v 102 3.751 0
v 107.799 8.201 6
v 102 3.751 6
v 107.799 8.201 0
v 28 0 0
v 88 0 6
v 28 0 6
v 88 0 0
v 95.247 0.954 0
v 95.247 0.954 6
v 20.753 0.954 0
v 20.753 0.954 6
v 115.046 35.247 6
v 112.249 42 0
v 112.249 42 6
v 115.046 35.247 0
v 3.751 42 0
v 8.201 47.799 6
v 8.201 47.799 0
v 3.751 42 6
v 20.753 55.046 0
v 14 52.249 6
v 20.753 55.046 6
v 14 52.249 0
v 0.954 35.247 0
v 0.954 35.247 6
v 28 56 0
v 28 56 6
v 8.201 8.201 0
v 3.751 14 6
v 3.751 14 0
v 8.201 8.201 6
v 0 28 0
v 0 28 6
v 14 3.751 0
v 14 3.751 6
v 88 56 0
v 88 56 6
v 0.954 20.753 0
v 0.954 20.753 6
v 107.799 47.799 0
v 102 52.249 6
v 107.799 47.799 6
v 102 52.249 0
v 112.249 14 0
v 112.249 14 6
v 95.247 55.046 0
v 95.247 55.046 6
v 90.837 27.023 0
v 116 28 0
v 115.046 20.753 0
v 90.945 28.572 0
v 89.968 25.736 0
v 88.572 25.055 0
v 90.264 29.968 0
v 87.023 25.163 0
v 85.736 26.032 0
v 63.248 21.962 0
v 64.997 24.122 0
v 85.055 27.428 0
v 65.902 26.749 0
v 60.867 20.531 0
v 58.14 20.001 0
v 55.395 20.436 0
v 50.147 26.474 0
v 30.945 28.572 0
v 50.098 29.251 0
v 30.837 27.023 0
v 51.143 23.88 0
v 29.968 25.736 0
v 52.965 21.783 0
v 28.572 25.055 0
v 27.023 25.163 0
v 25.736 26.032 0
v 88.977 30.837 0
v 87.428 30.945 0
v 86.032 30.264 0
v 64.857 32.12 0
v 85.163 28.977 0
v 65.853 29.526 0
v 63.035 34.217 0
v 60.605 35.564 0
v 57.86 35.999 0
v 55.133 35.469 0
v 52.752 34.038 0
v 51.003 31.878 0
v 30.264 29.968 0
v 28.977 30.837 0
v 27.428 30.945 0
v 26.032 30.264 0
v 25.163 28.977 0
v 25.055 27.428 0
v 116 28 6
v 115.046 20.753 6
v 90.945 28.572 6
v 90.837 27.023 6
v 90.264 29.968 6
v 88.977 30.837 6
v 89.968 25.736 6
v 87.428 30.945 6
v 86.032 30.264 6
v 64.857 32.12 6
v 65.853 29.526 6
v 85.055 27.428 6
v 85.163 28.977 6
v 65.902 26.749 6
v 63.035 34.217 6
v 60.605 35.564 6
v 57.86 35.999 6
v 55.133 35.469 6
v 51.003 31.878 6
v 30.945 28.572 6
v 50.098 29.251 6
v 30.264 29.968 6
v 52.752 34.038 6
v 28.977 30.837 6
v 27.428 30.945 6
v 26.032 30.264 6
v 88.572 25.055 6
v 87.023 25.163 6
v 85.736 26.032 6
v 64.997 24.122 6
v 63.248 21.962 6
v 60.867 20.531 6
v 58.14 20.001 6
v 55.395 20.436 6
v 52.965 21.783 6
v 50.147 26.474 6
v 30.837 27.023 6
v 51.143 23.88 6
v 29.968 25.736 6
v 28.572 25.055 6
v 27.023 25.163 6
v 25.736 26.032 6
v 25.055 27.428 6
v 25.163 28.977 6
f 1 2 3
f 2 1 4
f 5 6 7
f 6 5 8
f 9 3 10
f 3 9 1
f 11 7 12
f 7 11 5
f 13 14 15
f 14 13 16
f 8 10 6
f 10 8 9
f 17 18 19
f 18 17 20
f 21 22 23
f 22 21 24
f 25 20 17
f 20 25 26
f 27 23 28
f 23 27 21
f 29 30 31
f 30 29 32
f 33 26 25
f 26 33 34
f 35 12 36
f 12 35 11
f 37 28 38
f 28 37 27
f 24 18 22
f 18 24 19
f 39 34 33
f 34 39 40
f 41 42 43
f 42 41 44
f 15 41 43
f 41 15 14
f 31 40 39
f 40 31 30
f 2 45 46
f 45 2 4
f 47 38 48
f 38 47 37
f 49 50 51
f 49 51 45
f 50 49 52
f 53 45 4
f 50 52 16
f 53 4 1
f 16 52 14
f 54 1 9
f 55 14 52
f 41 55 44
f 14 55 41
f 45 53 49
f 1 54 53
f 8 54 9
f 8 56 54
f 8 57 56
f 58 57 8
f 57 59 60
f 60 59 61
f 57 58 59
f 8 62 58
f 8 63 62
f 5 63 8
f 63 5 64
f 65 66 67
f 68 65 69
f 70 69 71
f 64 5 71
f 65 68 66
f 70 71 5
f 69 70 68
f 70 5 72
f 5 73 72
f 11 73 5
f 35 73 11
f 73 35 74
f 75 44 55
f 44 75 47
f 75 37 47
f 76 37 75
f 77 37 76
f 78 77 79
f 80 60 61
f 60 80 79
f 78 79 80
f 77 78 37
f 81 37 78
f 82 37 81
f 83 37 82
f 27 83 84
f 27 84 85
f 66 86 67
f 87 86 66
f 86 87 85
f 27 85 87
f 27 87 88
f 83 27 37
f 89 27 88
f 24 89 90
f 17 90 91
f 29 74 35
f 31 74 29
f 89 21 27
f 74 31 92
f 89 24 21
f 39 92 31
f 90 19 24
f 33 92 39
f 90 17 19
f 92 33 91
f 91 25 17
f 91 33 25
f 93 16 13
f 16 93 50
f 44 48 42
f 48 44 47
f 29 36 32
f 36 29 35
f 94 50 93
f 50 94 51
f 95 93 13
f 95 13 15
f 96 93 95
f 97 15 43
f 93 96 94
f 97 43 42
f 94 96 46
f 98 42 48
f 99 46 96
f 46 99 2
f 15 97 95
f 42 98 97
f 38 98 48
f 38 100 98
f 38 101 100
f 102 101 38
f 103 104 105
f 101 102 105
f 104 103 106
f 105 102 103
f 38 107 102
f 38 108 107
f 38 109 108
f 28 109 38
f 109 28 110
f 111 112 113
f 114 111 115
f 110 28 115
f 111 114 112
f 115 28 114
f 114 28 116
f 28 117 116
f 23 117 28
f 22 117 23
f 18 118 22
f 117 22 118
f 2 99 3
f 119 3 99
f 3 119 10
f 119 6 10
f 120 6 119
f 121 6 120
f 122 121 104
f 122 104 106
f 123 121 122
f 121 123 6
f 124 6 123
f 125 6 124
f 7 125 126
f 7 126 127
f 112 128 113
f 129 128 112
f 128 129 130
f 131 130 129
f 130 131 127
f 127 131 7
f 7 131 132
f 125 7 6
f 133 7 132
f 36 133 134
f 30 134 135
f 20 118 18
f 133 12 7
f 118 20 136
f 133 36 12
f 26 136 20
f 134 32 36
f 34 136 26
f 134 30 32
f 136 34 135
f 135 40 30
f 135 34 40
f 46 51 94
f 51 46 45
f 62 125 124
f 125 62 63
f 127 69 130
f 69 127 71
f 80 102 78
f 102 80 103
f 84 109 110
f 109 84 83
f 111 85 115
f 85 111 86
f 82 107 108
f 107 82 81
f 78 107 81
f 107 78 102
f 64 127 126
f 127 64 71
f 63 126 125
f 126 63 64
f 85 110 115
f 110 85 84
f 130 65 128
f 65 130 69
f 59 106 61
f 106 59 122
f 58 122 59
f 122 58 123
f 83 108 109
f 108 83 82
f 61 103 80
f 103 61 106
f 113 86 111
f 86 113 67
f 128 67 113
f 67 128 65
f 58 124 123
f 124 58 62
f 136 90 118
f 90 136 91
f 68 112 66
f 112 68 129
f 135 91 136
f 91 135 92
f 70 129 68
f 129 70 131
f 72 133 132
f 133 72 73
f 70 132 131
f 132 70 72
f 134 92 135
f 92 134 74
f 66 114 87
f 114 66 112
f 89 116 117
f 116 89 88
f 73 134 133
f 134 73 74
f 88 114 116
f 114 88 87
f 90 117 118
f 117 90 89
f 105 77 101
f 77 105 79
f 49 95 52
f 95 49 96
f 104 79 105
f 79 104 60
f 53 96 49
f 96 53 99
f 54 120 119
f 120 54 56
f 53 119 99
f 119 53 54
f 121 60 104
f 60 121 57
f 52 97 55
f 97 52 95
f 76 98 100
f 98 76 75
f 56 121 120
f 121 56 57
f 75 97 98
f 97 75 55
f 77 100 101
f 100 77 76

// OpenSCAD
$fn = 32;

// ----------------------------------------------------------------------
// Spacer plate: obround span 60, caps R28
// ----------------------------------------------------------------------

// --- parameters (mm) ---
bore_r = 8;               // centre bore radius
bolt_r = 3;               // bolt hole radius
plate_t = 6;              // plate thickness, Z (extrusion height)
span = 60;                // obround span
cap_r = 28;               // cap radius

profile = [[28, 56], [20.753, 55.046], [14, 52.249], [8.201, 47.799], [3.751, 42], [0.954, 35.247], [0, 28], [0.954, 20.753], [3.751, 14], [8.201, 8.201], [14, 3.751], [20.753, 0.954], [28, 0], [88, 0], [95.247, 0.954], [102, 3.751], [107.799, 8.201], [112.249, 14], [115.046, 20.753], [116, 28], [115.046, 35.247], [112.249, 42], [107.799, 47.799], [102, 52.249], [95.247, 55.046], [88, 56]];  // primary outline, 26 points, counter clockwise
void_1 = [[65.853, 29.526], [64.857, 32.12], [63.035, 34.217], [60.605, 35.564], [57.86, 35.999], [55.133, 35.469], [52.752, 34.038], [51.003, 31.878], [50.098, 29.251], [50.147, 26.474], [51.143, 23.88], [52.965, 21.783], [55.395, 20.436], [58.14, 20.001], [60.867, 20.531], [63.248, 21.962], [64.997, 24.122], [65.902, 26.749]];  // centre bore, 18 points
void_2 = [[30.945, 28.572], [30.264, 29.968], [28.977, 30.837], [27.428, 30.945], [26.032, 30.264], [25.163, 28.977], [25.055, 27.428], [25.736, 26.032], [27.023, 25.163], [28.572, 25.055], [29.968, 25.736], [30.837, 27.023]];  // end hole, 12 points
void_3 = [[90.945, 28.572], [90.264, 29.968], [88.977, 30.837], [87.428, 30.945], [86.032, 30.264], [85.163, 28.977], [85.055, 27.428], [85.736, 26.032], [87.023, 25.163], [88.572, 25.055], [89.968, 25.736], [90.837, 27.023]];  // end hole, 12 points

// --- the one profile operation ---
difference() {
  linear_extrude(height = plate_t) polygon(points = profile);
  translate([0, 0, -1])
    linear_extrude(height = plate_t + 2) polygon(points = void_1);
  translate([0, 0, -1])
    linear_extrude(height = plate_t + 2) polygon(points = void_2);
  translate([0, 0, -1])
    linear_extrude(height = plate_t + 2) polygon(points = void_3);
}
